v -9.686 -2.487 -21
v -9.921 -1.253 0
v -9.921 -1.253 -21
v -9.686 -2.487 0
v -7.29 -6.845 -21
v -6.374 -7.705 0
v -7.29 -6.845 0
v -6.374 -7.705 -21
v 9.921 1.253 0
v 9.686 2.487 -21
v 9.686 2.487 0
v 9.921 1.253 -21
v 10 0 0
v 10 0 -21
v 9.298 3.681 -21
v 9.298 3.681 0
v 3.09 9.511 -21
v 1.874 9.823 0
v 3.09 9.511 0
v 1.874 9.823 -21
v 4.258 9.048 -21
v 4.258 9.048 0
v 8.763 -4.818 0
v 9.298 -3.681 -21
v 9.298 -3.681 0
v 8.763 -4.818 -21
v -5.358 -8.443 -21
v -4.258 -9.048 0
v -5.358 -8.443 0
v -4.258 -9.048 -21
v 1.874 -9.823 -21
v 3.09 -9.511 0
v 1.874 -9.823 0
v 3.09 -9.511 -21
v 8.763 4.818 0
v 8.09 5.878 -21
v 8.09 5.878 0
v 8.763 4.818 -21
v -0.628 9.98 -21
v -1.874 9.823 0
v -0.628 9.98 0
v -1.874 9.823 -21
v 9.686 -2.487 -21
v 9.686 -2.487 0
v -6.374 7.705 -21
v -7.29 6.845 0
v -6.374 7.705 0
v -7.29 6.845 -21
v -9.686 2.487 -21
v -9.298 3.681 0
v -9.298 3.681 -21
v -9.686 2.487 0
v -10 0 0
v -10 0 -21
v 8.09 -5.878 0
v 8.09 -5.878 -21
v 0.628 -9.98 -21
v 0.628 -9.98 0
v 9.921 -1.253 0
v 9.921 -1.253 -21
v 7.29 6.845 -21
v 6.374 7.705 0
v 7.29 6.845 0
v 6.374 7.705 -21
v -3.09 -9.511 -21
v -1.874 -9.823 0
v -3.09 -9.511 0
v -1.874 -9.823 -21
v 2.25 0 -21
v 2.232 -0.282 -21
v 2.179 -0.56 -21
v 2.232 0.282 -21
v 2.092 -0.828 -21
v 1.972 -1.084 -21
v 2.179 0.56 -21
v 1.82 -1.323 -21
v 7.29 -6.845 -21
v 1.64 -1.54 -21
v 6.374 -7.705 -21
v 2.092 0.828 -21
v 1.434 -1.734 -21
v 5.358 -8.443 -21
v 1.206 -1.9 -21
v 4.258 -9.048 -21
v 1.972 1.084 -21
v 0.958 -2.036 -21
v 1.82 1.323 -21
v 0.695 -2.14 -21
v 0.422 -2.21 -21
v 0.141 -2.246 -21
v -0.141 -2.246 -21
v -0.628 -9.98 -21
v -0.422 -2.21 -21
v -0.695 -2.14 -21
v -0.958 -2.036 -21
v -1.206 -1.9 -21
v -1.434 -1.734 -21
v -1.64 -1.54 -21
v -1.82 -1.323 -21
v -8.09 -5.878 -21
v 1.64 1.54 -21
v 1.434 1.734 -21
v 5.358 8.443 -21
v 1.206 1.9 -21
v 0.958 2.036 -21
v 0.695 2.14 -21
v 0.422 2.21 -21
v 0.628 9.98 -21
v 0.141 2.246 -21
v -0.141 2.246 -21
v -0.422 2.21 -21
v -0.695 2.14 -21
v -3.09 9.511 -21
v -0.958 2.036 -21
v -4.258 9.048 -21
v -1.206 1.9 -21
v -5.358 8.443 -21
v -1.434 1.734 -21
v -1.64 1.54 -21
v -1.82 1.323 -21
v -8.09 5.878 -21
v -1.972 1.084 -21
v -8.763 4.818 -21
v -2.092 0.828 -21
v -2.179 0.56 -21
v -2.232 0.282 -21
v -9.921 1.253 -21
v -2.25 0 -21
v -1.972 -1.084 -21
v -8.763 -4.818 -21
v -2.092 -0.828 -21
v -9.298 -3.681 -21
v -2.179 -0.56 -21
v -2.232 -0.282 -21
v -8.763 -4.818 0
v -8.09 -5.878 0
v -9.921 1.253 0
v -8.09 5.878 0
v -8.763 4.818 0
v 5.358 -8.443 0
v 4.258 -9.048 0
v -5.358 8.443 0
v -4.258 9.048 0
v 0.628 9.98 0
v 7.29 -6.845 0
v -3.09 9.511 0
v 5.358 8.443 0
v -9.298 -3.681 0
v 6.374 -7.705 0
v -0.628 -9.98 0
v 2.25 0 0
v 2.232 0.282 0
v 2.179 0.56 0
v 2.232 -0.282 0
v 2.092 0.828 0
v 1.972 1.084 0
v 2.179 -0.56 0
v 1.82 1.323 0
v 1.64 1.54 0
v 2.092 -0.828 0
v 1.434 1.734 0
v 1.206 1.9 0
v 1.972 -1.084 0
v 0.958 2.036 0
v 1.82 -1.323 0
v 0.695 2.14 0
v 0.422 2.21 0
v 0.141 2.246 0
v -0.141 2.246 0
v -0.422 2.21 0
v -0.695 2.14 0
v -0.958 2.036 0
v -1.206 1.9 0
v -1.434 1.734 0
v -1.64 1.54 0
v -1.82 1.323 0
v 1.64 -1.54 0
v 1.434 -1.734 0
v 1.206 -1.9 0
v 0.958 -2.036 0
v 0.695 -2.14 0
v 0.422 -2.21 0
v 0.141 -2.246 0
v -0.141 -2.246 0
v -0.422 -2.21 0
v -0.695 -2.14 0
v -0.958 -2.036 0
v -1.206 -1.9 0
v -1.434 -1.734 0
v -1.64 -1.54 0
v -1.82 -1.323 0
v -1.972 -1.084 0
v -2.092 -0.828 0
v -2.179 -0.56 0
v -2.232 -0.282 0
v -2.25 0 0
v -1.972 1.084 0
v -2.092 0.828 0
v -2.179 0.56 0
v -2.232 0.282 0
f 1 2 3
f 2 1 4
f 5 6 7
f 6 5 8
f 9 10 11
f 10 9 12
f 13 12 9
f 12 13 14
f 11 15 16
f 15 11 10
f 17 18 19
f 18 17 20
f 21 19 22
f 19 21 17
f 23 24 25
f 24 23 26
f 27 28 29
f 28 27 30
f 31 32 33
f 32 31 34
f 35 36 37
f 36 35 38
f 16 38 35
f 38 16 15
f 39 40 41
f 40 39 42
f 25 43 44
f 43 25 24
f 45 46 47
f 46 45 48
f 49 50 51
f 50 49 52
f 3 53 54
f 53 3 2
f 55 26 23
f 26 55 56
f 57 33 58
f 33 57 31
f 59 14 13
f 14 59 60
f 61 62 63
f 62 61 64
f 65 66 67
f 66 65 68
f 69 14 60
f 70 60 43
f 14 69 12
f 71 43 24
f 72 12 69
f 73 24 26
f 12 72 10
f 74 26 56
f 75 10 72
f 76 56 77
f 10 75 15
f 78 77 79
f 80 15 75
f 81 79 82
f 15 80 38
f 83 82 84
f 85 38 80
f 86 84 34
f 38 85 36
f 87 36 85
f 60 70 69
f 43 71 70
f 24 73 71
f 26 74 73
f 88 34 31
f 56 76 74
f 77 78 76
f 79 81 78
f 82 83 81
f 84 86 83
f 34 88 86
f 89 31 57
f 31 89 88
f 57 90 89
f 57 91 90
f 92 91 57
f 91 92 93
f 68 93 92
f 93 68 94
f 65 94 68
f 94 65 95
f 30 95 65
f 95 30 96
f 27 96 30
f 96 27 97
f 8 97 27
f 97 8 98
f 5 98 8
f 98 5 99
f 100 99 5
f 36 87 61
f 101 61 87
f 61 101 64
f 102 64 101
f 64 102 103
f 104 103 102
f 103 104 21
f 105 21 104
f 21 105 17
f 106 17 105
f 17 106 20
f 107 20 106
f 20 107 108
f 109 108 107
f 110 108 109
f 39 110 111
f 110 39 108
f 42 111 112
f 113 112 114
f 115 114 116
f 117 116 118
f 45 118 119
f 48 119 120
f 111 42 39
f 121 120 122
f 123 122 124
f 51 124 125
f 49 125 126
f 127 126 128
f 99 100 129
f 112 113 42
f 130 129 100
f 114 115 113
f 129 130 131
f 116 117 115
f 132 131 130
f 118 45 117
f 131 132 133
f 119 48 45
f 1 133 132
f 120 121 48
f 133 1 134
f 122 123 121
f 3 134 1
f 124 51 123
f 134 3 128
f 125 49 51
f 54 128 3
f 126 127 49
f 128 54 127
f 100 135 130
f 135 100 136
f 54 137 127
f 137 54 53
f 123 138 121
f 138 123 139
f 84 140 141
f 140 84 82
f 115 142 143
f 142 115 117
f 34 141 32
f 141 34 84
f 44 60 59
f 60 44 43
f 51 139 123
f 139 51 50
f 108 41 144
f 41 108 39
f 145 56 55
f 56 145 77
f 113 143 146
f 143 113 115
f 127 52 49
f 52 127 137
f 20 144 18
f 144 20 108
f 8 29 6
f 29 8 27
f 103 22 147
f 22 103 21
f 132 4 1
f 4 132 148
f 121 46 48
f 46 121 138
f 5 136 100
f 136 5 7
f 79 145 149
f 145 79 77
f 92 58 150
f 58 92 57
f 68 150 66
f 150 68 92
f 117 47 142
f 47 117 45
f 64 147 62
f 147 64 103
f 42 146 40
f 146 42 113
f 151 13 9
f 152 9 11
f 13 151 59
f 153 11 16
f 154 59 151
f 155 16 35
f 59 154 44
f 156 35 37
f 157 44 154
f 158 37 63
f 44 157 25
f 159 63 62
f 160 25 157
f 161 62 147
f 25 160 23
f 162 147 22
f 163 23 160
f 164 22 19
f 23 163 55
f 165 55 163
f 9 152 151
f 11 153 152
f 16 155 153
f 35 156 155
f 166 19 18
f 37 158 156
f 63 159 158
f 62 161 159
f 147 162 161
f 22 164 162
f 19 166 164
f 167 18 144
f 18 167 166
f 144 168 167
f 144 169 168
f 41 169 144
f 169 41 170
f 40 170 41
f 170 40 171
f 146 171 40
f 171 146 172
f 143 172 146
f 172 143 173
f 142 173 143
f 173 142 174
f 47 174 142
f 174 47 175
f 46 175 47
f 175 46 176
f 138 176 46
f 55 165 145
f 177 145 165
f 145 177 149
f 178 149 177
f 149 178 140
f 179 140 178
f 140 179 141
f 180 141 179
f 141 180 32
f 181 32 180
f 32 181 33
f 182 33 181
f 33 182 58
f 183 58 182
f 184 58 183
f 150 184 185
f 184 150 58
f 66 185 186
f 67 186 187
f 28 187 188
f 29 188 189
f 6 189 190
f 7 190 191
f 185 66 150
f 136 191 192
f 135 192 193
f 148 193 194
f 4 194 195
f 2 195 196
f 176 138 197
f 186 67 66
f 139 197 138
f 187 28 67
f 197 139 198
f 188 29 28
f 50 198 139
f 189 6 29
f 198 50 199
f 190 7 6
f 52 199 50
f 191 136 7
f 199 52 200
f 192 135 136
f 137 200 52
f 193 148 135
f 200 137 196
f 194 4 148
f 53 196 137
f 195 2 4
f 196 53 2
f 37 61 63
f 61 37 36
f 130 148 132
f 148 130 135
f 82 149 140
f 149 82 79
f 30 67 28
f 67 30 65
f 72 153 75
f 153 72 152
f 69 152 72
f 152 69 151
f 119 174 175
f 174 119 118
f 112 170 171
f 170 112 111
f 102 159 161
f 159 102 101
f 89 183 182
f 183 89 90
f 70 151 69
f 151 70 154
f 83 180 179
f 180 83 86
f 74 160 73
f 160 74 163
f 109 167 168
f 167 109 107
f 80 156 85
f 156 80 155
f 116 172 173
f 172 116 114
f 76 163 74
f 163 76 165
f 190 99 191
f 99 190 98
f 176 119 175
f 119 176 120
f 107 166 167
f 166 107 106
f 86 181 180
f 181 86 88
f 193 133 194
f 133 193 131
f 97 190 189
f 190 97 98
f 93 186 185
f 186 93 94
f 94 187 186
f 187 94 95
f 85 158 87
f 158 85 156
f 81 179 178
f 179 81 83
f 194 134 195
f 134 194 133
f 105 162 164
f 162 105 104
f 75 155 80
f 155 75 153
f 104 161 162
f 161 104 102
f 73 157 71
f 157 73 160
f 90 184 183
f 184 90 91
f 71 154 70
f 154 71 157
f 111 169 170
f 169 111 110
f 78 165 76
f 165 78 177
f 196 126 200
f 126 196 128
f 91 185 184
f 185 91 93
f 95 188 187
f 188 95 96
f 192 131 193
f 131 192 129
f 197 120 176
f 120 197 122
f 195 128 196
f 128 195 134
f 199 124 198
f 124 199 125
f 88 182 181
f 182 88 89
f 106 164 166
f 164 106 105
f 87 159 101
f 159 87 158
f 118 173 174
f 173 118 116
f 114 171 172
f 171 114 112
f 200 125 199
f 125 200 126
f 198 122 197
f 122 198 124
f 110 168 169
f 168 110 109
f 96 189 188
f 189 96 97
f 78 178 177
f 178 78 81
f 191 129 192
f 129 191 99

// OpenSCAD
$fn = 50;


difference() {
	union() {
		translate(v = [0, 0, -21.0000000000]) {
			cylinder(h = 21, r = 10.0000000000);
		}
		cylinder(h = 0, r = 16.0000000000);
	}
	union() {
		#translate(v = [0, 0, -21]) {
			cylinder(h = 21, r = 2.2500000000);
		}
	}
}
